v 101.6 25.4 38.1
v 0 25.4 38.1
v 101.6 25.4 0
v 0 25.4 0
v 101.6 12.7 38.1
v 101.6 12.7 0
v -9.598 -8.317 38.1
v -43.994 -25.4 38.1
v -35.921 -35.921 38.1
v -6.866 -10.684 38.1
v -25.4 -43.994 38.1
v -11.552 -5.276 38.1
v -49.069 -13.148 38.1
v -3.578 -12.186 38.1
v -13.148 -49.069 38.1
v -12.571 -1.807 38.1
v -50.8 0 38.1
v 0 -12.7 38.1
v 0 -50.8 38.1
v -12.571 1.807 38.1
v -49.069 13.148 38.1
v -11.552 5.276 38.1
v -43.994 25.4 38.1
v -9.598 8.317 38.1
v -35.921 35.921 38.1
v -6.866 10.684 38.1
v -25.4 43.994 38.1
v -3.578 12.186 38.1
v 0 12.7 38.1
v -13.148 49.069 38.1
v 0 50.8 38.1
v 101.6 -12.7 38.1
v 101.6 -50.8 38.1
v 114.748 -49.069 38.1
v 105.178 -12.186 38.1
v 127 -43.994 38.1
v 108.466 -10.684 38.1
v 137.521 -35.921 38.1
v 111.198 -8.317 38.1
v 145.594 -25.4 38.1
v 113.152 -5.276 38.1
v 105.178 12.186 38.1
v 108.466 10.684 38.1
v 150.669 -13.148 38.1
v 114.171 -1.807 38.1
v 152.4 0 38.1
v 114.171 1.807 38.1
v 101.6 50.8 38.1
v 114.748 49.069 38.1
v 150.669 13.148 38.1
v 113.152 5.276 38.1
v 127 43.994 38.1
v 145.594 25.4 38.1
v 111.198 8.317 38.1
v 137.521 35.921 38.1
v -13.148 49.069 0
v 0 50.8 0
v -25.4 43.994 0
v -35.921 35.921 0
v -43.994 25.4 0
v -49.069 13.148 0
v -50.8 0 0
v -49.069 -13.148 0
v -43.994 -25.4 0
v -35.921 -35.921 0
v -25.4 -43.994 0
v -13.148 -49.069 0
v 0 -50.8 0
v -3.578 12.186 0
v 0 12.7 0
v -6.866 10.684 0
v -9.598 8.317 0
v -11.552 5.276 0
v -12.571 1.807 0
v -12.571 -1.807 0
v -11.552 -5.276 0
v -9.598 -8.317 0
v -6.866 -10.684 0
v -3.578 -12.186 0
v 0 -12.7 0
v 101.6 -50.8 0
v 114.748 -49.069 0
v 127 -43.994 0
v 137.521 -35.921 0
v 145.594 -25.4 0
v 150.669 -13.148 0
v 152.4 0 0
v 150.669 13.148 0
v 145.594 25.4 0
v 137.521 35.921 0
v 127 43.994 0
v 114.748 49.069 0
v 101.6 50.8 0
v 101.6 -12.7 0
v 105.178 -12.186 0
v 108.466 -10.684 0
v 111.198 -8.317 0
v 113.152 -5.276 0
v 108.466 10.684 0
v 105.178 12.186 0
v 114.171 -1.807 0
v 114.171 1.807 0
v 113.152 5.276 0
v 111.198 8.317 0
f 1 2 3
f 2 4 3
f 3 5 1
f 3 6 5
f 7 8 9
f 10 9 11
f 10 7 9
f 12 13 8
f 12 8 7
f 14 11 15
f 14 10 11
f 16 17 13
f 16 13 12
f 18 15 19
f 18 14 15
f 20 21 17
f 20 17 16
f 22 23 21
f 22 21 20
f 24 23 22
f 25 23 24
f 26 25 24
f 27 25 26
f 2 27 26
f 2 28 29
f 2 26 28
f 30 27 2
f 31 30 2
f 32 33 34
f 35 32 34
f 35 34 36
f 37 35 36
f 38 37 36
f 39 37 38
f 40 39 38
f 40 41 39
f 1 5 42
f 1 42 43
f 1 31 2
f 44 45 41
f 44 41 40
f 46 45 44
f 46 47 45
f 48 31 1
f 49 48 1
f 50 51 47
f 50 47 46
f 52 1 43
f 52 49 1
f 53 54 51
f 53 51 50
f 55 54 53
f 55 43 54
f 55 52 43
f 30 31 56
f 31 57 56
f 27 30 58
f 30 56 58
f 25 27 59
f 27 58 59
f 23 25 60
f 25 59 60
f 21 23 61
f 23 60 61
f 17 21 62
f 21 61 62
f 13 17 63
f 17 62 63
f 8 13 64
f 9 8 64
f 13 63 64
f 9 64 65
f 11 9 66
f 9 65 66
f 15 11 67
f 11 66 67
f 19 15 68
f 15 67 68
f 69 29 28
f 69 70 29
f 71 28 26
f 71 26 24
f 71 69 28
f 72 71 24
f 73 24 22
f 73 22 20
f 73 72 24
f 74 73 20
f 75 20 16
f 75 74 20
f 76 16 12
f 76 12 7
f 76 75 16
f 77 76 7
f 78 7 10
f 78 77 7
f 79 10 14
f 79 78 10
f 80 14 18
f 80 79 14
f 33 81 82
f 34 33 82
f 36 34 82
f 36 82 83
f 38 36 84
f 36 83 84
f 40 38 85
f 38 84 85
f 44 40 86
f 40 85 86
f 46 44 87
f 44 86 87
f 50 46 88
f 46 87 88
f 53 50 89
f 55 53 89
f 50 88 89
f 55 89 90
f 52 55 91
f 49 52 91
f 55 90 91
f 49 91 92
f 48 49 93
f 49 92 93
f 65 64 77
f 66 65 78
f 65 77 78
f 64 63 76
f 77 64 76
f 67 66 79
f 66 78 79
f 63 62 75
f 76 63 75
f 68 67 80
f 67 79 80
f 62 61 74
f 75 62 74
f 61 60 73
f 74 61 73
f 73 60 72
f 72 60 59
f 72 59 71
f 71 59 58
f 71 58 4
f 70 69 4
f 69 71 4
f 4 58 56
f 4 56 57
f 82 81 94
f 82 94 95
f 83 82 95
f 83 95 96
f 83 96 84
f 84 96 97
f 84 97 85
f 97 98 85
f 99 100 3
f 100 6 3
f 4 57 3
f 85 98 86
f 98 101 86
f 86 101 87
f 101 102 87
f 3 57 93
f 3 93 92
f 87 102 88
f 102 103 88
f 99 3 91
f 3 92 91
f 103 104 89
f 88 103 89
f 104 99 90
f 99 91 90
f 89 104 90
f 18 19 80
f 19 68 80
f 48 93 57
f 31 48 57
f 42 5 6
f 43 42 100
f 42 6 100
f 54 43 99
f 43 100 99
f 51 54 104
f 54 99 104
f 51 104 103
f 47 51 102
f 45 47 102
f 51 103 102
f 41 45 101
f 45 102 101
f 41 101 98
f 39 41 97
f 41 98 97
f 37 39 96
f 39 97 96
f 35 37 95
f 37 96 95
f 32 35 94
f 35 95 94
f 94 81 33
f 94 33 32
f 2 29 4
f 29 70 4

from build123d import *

# Parameters (mm, degrees)
F0_R     = 12.7
F1_DEPTH = 12.7
F2_DEPTH = 76.2
F3_DEPTH = 25.4


with BuildPart() as f1:
    # F0 (on Top) → F1 (new body)
    with BuildSketch(Plane.XY):
        with BuildLine():
            ThreePointArc((0, 50.8), (-50.8, 0), (0, -50.8))
            Line((0, -50.8), (101.6, -50.8))
            ThreePointArc((101.6, -50.8), (152.4, 0), (101.6, 50.8))
            Line((101.6, 50.8), (0, 50.8))
        make_face()
        Circle(F0_R, mode=Mode.SUBTRACT)
        with Locations((101.6, 0)):
            Circle(F0_R, mode=Mode.SUBTRACT)
    extrude(amount=F1_DEPTH)

    # F2 (cut): a face of the model
    f2_faces = [f1.faces().sort_by_distance(p)[0] for p in [
        (50.8, -50.8, 6.35),
    ]]
    extrude(f2_faces, amount=-F2_DEPTH, mode=Mode.SUBTRACT)

    # F3 (add): a face of the model
    f3_faces = [f1.faces().sort_by_distance(p)[0] for p in [
        (150.1281549349, 0, 12.7),
    ]]
    extrude(f3_faces, amount=F3_DEPTH)


solid = f1.part
